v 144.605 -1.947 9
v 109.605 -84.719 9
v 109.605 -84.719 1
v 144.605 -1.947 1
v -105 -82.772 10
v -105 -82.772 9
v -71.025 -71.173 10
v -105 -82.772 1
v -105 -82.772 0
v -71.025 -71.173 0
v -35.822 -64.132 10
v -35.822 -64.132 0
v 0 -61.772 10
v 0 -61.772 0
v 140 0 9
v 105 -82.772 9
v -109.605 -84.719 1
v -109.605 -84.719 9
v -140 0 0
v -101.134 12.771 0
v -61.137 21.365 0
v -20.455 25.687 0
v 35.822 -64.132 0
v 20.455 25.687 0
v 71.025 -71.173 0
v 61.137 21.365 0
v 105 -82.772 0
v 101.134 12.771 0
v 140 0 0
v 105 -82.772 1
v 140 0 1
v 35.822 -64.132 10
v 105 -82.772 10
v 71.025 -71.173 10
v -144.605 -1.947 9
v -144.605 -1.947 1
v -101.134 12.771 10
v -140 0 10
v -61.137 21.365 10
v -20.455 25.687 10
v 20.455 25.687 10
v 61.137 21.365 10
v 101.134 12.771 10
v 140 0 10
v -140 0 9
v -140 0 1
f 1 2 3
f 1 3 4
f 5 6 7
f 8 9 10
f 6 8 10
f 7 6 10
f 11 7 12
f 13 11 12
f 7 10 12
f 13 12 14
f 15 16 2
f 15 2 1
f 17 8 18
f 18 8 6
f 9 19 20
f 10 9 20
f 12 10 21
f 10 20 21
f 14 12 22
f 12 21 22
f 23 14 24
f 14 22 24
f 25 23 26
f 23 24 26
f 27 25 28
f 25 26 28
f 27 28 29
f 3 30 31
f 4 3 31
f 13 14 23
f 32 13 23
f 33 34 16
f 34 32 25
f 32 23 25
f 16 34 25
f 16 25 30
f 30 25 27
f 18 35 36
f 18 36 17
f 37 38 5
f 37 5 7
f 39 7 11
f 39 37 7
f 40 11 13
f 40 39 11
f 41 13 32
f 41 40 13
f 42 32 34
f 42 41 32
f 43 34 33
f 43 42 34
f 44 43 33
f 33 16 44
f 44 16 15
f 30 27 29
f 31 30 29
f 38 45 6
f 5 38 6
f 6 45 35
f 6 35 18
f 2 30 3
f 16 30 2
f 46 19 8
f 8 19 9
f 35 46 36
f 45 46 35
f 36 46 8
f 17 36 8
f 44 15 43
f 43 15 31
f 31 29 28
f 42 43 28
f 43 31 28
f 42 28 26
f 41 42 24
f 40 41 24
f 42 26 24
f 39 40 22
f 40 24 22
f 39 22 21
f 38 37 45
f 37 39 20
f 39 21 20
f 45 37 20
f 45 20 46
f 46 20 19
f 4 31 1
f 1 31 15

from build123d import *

# Parameters (mm, degrees)
F1_DEPTH = 10
F2_W     = 89.8676701995
F2_H     = 8
F3_DEPTH = 5
F4_W     = 89.8676701995
F4_H     = 8
F5_DEPTH = 5


# Not quite as in the source:
# - a feature names something its author has since deleted; it is built from what else it names


with BuildPart() as f1:
    # F0 (on Top) → F1 (new body)
    with BuildSketch(Plane.XY):
        with BuildLine():
            Line((0, 0), (-140, 0))
            Line((-140, 0), (-105, -82.771964741))
            ThreePointArc((-105, -82.771964741), (-53.5397048927, -67.0734402774), (0, -61.771964741))
            Line((0, -61.771964741), (0, 0))
        make_face()
        with BuildLine():
            Line((140, 0), (0, 0))
            Line((0, 0), (0, -61.771964741))
            ThreePointArc((0, -61.771964741), (53.5397048927, -67.0734402774), (105, -82.771964741))
            Line((105, -82.771964741), (140, 0))
        make_face()
        with BuildLine():
            ThreePointArc((0, 26.228035259), (-71.217817001, 19.6144809107), (-140, 0))
            Line((-140, 0), (0, 0))
            Line((0, 0), (0, 26.228035259))
        make_face()
        with BuildLine():
            Line((0, 26.228035259), (0, 0))
            Line((0, 0), (140, 0))
            ThreePointArc((140, 0), (71.217817001, 19.6144809107), (0, 26.228035259))
        make_face()
    extrude(amount=F1_DEPTH)

    # F2 (on face) → F3 (join)
    with BuildSketch(Plane(origin=(118.7647607356, -50.2194993045, 0), x_dir=(0.3894615263, 0.9210427349, 0), z_dir=(0.9210427349, -0.3894615263, 0))):
        with Locations((9.5907785808, 5)):
            Rectangle(F2_W, F2_H)
    extrude(amount=F3_DEPTH)

    # F4 (on face) → F5 (join)
    with BuildSketch(Plane(origin=(-118.7647607356, -50.2194993045, 0), x_dir=(0.3894615263, -0.9210427349, 0), z_dir=(-0.9210427349, -0.3894615263, 0))):
        with Locations((-9.5907785808, 5)):
            Rectangle(F4_W, F4_H)
    extrude(amount=F5_DEPTH)


solid = f1.part
